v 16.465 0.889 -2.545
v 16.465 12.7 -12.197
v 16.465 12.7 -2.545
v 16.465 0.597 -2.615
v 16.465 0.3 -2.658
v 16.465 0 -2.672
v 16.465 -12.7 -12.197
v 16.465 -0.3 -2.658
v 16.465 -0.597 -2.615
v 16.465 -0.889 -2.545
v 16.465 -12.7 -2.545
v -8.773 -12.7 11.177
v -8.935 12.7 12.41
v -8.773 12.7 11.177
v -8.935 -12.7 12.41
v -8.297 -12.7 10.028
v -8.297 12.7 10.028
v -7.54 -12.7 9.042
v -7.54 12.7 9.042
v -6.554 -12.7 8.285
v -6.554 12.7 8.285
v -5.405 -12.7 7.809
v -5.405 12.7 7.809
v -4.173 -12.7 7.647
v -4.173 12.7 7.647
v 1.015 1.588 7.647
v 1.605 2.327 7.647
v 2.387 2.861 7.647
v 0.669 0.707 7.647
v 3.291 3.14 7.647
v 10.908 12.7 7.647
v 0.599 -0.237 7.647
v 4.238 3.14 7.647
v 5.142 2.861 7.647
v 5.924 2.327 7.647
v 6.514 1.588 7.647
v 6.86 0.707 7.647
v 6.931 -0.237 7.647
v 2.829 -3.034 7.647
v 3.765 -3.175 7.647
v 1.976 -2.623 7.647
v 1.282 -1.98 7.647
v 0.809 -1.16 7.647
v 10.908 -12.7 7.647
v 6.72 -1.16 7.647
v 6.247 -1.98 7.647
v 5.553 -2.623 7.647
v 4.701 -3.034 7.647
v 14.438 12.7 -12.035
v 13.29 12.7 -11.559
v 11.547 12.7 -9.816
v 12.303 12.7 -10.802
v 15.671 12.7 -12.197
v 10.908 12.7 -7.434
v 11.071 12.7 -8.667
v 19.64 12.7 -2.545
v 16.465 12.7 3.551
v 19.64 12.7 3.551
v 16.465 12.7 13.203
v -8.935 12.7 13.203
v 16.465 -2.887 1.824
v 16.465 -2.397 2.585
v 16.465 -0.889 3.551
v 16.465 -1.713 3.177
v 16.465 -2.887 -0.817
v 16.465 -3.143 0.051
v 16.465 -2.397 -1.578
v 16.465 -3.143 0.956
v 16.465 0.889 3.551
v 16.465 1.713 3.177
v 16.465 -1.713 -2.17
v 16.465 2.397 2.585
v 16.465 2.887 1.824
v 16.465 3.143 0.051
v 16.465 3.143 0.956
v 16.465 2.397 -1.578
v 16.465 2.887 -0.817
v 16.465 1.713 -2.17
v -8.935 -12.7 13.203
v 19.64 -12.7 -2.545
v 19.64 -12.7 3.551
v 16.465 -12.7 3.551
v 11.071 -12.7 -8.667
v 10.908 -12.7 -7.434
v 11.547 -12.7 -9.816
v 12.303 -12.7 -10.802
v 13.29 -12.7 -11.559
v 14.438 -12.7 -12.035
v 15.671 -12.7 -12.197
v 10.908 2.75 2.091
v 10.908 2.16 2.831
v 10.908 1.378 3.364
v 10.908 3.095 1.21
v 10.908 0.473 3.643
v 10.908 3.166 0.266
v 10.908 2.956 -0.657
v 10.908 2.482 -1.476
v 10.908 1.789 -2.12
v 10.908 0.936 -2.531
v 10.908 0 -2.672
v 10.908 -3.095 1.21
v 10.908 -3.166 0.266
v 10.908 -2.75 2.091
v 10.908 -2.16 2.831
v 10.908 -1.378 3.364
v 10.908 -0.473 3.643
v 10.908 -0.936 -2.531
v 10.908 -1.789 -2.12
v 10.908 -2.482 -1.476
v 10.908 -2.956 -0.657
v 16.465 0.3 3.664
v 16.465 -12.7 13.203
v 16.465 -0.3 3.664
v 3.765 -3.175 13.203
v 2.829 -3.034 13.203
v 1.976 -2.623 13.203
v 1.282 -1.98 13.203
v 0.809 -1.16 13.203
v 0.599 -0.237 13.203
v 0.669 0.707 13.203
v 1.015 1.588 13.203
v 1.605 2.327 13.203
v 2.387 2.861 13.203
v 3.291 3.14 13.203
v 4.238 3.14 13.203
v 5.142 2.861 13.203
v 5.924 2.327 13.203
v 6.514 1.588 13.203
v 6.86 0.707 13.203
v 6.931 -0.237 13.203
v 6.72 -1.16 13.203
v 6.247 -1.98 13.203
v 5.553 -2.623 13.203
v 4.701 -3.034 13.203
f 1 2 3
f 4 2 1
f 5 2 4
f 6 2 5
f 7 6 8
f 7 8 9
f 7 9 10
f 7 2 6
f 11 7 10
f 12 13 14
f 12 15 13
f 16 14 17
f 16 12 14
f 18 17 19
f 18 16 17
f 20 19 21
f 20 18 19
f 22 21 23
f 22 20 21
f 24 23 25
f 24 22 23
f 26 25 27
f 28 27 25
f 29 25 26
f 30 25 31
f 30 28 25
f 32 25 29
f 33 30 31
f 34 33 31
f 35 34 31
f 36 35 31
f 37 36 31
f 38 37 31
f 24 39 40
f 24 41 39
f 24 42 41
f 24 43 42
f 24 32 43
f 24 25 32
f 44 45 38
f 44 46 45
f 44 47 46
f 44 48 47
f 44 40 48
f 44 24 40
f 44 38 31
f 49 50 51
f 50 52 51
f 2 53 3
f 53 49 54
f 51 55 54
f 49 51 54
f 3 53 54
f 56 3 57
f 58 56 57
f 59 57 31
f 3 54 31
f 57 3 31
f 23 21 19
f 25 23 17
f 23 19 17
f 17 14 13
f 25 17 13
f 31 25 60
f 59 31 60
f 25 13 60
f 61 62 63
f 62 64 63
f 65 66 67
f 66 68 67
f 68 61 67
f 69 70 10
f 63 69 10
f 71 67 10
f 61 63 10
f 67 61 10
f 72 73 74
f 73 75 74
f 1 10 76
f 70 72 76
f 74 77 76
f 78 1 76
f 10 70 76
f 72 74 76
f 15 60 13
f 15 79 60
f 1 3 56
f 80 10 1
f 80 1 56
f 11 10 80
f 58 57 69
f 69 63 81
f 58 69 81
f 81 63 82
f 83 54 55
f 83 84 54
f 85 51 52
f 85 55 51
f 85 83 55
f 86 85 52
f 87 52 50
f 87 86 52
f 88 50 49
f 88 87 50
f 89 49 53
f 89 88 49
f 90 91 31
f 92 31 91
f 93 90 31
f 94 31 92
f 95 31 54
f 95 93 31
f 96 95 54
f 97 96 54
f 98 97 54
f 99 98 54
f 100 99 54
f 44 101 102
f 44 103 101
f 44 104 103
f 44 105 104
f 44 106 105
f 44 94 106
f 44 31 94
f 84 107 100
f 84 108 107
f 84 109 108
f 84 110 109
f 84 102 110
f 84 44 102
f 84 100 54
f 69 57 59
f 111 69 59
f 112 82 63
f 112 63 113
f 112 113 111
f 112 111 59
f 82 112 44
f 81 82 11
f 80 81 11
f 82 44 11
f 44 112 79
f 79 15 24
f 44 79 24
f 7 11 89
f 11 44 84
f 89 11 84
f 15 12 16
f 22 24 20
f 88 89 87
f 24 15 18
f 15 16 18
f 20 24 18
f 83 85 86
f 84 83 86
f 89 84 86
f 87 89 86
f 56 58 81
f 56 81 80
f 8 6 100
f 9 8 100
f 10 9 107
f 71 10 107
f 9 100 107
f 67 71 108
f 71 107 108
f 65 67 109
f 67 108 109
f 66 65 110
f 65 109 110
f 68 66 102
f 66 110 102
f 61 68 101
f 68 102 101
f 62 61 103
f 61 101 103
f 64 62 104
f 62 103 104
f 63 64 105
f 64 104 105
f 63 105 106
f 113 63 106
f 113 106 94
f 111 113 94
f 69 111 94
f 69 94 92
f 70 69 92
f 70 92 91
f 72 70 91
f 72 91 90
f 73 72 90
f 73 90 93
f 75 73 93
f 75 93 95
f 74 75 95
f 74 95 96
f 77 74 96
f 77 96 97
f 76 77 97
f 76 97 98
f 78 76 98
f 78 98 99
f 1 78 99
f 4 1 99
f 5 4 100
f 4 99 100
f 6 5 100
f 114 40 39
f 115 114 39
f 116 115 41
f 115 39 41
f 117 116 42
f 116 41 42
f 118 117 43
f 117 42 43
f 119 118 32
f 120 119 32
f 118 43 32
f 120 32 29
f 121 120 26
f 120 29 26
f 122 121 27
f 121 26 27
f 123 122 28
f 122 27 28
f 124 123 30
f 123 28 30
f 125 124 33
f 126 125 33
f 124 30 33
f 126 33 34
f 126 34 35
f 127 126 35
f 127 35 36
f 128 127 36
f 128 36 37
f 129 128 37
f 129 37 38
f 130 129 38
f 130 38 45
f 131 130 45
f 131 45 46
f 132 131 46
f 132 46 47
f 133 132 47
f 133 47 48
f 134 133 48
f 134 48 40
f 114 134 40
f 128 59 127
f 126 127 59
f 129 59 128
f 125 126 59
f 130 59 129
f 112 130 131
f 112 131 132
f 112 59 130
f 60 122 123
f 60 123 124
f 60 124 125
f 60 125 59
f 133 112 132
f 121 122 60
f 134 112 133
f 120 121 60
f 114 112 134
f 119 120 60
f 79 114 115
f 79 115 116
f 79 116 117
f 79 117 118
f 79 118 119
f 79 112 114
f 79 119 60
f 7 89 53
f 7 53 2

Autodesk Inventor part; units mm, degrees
ref_plane "YZ Plane" through (0, 0, 0) normal (1, 0, 0) x (0, 1, 0)
ref_plane "XY Plane" through (0, 0, 0) normal (0, 0, 1) x (1, 0, 0)
sketch "Sketch1" plane through (0, 0, 0) normal (0, 1, 0) x (-1, 0, 0)
  point P0 (0, 0)
sketch "Sketch2" plane through (0, 0, 0) normal (0, 1, 0) x (-1, 0, 0)
  line L0 (-16.4647, 13.2032) -> (-10.9085, 13.2032)
  line L1 (-10.9085, 7.647) -> (-10.9085, -12.1968)
  line L2 (-10.9085, -12.1968) -> (-16.4647, -12.1968)
  line L3 (-16.4647, -12.1968) -> (-16.4647, 13.2032)
  line L4 (-16.4647, 13.2032) -> (8.9353, 13.2032)
  line L5 (8.9353, 13.2032) -> (8.9353, 7.647)
  line L6 (8.9353, 7.647) -> (-10.9085, 7.647)
  line L7 (-16.4647, 7.647) -> (-16.4647, 13.2032)
  point P0 (0, 0)
  dimension "d0" = 5.5563
  dimension "d1" = 25.4
  dimension "d3" = 25.4
  dimension "d4" = 5.5563
extrude "Extrusion1" add sketch "Sketch2" along normal mid plane 25.4
sketch "Sketch3" plane through (16.4647, -12.7, 13.2032) normal (1, 0, 0) x (0, 0, -1)
  line L0 (25.4, 0) -> (0, 0) projected
  line L1 (25.4, 0) -> (25.4, 25.4) projected
  point P0 (13.2032, 12.7)
  point P1 (12.7, 12.7)
  point P2 (0, 0)
  dimension "d7" = 12.7
  dimension "d8" = 12.7
sketch "Sketch4" plane through (-8.9353, -12.7, 13.2032) normal (0, 0, 1) x (1, 0, 0)
  line L0 (25.4, 25.4) -> (25.4, 0) projected
  line L1 (25.4, 0) -> (0, 0) projected
  point P0 (8.9353, 12.7)
  point P1 (12.7, 12.7)
  dimension "d9" = 12.7
  dimension "d10" = 12.7
hole "Hole1" at (3.7647, 0, 13.2032) direction (0, 0, -1) diameter 6.35 end through all
hole "Hole2" at (16.4647, 0, 0.5032) direction (-1, 0, 0) diameter 6.35 end through all
fillet "Fillet1" radius 4.7625 2 edges at (10.9085, 0, -12.1968) (-8.9353, 0, 7.647)
sketch "Sketch5" plane through (16.4647, -12.7, 13.2032) normal (1, 0, 0) x (0, 0, -1)
  line L0 (20.6375, 25.4) -> (5.5562, 25.4) projected
  line L1 (9.652, 25.4) -> (9.652, 0)
  line L2 (5.5562, 0) -> (20.6375, 0) projected
  line L3 (15.748, 25.4) -> (15.748, 0)
  line L4 (0, 25.4) -> (0, 0) projected
  line L5 (9.652, 25.4) -> (15.748, 25.4)
  line L6 (15.748, 0) -> (9.652, 0)
  point P0 (13.2032, 12.7)
  dimension "d26" = 6.096
  dimension "d27" = 9.652
extrude "Extrusion2" add sketch "Sketch5" along normal blind 3.175
properties part number "rope connection to cart"
